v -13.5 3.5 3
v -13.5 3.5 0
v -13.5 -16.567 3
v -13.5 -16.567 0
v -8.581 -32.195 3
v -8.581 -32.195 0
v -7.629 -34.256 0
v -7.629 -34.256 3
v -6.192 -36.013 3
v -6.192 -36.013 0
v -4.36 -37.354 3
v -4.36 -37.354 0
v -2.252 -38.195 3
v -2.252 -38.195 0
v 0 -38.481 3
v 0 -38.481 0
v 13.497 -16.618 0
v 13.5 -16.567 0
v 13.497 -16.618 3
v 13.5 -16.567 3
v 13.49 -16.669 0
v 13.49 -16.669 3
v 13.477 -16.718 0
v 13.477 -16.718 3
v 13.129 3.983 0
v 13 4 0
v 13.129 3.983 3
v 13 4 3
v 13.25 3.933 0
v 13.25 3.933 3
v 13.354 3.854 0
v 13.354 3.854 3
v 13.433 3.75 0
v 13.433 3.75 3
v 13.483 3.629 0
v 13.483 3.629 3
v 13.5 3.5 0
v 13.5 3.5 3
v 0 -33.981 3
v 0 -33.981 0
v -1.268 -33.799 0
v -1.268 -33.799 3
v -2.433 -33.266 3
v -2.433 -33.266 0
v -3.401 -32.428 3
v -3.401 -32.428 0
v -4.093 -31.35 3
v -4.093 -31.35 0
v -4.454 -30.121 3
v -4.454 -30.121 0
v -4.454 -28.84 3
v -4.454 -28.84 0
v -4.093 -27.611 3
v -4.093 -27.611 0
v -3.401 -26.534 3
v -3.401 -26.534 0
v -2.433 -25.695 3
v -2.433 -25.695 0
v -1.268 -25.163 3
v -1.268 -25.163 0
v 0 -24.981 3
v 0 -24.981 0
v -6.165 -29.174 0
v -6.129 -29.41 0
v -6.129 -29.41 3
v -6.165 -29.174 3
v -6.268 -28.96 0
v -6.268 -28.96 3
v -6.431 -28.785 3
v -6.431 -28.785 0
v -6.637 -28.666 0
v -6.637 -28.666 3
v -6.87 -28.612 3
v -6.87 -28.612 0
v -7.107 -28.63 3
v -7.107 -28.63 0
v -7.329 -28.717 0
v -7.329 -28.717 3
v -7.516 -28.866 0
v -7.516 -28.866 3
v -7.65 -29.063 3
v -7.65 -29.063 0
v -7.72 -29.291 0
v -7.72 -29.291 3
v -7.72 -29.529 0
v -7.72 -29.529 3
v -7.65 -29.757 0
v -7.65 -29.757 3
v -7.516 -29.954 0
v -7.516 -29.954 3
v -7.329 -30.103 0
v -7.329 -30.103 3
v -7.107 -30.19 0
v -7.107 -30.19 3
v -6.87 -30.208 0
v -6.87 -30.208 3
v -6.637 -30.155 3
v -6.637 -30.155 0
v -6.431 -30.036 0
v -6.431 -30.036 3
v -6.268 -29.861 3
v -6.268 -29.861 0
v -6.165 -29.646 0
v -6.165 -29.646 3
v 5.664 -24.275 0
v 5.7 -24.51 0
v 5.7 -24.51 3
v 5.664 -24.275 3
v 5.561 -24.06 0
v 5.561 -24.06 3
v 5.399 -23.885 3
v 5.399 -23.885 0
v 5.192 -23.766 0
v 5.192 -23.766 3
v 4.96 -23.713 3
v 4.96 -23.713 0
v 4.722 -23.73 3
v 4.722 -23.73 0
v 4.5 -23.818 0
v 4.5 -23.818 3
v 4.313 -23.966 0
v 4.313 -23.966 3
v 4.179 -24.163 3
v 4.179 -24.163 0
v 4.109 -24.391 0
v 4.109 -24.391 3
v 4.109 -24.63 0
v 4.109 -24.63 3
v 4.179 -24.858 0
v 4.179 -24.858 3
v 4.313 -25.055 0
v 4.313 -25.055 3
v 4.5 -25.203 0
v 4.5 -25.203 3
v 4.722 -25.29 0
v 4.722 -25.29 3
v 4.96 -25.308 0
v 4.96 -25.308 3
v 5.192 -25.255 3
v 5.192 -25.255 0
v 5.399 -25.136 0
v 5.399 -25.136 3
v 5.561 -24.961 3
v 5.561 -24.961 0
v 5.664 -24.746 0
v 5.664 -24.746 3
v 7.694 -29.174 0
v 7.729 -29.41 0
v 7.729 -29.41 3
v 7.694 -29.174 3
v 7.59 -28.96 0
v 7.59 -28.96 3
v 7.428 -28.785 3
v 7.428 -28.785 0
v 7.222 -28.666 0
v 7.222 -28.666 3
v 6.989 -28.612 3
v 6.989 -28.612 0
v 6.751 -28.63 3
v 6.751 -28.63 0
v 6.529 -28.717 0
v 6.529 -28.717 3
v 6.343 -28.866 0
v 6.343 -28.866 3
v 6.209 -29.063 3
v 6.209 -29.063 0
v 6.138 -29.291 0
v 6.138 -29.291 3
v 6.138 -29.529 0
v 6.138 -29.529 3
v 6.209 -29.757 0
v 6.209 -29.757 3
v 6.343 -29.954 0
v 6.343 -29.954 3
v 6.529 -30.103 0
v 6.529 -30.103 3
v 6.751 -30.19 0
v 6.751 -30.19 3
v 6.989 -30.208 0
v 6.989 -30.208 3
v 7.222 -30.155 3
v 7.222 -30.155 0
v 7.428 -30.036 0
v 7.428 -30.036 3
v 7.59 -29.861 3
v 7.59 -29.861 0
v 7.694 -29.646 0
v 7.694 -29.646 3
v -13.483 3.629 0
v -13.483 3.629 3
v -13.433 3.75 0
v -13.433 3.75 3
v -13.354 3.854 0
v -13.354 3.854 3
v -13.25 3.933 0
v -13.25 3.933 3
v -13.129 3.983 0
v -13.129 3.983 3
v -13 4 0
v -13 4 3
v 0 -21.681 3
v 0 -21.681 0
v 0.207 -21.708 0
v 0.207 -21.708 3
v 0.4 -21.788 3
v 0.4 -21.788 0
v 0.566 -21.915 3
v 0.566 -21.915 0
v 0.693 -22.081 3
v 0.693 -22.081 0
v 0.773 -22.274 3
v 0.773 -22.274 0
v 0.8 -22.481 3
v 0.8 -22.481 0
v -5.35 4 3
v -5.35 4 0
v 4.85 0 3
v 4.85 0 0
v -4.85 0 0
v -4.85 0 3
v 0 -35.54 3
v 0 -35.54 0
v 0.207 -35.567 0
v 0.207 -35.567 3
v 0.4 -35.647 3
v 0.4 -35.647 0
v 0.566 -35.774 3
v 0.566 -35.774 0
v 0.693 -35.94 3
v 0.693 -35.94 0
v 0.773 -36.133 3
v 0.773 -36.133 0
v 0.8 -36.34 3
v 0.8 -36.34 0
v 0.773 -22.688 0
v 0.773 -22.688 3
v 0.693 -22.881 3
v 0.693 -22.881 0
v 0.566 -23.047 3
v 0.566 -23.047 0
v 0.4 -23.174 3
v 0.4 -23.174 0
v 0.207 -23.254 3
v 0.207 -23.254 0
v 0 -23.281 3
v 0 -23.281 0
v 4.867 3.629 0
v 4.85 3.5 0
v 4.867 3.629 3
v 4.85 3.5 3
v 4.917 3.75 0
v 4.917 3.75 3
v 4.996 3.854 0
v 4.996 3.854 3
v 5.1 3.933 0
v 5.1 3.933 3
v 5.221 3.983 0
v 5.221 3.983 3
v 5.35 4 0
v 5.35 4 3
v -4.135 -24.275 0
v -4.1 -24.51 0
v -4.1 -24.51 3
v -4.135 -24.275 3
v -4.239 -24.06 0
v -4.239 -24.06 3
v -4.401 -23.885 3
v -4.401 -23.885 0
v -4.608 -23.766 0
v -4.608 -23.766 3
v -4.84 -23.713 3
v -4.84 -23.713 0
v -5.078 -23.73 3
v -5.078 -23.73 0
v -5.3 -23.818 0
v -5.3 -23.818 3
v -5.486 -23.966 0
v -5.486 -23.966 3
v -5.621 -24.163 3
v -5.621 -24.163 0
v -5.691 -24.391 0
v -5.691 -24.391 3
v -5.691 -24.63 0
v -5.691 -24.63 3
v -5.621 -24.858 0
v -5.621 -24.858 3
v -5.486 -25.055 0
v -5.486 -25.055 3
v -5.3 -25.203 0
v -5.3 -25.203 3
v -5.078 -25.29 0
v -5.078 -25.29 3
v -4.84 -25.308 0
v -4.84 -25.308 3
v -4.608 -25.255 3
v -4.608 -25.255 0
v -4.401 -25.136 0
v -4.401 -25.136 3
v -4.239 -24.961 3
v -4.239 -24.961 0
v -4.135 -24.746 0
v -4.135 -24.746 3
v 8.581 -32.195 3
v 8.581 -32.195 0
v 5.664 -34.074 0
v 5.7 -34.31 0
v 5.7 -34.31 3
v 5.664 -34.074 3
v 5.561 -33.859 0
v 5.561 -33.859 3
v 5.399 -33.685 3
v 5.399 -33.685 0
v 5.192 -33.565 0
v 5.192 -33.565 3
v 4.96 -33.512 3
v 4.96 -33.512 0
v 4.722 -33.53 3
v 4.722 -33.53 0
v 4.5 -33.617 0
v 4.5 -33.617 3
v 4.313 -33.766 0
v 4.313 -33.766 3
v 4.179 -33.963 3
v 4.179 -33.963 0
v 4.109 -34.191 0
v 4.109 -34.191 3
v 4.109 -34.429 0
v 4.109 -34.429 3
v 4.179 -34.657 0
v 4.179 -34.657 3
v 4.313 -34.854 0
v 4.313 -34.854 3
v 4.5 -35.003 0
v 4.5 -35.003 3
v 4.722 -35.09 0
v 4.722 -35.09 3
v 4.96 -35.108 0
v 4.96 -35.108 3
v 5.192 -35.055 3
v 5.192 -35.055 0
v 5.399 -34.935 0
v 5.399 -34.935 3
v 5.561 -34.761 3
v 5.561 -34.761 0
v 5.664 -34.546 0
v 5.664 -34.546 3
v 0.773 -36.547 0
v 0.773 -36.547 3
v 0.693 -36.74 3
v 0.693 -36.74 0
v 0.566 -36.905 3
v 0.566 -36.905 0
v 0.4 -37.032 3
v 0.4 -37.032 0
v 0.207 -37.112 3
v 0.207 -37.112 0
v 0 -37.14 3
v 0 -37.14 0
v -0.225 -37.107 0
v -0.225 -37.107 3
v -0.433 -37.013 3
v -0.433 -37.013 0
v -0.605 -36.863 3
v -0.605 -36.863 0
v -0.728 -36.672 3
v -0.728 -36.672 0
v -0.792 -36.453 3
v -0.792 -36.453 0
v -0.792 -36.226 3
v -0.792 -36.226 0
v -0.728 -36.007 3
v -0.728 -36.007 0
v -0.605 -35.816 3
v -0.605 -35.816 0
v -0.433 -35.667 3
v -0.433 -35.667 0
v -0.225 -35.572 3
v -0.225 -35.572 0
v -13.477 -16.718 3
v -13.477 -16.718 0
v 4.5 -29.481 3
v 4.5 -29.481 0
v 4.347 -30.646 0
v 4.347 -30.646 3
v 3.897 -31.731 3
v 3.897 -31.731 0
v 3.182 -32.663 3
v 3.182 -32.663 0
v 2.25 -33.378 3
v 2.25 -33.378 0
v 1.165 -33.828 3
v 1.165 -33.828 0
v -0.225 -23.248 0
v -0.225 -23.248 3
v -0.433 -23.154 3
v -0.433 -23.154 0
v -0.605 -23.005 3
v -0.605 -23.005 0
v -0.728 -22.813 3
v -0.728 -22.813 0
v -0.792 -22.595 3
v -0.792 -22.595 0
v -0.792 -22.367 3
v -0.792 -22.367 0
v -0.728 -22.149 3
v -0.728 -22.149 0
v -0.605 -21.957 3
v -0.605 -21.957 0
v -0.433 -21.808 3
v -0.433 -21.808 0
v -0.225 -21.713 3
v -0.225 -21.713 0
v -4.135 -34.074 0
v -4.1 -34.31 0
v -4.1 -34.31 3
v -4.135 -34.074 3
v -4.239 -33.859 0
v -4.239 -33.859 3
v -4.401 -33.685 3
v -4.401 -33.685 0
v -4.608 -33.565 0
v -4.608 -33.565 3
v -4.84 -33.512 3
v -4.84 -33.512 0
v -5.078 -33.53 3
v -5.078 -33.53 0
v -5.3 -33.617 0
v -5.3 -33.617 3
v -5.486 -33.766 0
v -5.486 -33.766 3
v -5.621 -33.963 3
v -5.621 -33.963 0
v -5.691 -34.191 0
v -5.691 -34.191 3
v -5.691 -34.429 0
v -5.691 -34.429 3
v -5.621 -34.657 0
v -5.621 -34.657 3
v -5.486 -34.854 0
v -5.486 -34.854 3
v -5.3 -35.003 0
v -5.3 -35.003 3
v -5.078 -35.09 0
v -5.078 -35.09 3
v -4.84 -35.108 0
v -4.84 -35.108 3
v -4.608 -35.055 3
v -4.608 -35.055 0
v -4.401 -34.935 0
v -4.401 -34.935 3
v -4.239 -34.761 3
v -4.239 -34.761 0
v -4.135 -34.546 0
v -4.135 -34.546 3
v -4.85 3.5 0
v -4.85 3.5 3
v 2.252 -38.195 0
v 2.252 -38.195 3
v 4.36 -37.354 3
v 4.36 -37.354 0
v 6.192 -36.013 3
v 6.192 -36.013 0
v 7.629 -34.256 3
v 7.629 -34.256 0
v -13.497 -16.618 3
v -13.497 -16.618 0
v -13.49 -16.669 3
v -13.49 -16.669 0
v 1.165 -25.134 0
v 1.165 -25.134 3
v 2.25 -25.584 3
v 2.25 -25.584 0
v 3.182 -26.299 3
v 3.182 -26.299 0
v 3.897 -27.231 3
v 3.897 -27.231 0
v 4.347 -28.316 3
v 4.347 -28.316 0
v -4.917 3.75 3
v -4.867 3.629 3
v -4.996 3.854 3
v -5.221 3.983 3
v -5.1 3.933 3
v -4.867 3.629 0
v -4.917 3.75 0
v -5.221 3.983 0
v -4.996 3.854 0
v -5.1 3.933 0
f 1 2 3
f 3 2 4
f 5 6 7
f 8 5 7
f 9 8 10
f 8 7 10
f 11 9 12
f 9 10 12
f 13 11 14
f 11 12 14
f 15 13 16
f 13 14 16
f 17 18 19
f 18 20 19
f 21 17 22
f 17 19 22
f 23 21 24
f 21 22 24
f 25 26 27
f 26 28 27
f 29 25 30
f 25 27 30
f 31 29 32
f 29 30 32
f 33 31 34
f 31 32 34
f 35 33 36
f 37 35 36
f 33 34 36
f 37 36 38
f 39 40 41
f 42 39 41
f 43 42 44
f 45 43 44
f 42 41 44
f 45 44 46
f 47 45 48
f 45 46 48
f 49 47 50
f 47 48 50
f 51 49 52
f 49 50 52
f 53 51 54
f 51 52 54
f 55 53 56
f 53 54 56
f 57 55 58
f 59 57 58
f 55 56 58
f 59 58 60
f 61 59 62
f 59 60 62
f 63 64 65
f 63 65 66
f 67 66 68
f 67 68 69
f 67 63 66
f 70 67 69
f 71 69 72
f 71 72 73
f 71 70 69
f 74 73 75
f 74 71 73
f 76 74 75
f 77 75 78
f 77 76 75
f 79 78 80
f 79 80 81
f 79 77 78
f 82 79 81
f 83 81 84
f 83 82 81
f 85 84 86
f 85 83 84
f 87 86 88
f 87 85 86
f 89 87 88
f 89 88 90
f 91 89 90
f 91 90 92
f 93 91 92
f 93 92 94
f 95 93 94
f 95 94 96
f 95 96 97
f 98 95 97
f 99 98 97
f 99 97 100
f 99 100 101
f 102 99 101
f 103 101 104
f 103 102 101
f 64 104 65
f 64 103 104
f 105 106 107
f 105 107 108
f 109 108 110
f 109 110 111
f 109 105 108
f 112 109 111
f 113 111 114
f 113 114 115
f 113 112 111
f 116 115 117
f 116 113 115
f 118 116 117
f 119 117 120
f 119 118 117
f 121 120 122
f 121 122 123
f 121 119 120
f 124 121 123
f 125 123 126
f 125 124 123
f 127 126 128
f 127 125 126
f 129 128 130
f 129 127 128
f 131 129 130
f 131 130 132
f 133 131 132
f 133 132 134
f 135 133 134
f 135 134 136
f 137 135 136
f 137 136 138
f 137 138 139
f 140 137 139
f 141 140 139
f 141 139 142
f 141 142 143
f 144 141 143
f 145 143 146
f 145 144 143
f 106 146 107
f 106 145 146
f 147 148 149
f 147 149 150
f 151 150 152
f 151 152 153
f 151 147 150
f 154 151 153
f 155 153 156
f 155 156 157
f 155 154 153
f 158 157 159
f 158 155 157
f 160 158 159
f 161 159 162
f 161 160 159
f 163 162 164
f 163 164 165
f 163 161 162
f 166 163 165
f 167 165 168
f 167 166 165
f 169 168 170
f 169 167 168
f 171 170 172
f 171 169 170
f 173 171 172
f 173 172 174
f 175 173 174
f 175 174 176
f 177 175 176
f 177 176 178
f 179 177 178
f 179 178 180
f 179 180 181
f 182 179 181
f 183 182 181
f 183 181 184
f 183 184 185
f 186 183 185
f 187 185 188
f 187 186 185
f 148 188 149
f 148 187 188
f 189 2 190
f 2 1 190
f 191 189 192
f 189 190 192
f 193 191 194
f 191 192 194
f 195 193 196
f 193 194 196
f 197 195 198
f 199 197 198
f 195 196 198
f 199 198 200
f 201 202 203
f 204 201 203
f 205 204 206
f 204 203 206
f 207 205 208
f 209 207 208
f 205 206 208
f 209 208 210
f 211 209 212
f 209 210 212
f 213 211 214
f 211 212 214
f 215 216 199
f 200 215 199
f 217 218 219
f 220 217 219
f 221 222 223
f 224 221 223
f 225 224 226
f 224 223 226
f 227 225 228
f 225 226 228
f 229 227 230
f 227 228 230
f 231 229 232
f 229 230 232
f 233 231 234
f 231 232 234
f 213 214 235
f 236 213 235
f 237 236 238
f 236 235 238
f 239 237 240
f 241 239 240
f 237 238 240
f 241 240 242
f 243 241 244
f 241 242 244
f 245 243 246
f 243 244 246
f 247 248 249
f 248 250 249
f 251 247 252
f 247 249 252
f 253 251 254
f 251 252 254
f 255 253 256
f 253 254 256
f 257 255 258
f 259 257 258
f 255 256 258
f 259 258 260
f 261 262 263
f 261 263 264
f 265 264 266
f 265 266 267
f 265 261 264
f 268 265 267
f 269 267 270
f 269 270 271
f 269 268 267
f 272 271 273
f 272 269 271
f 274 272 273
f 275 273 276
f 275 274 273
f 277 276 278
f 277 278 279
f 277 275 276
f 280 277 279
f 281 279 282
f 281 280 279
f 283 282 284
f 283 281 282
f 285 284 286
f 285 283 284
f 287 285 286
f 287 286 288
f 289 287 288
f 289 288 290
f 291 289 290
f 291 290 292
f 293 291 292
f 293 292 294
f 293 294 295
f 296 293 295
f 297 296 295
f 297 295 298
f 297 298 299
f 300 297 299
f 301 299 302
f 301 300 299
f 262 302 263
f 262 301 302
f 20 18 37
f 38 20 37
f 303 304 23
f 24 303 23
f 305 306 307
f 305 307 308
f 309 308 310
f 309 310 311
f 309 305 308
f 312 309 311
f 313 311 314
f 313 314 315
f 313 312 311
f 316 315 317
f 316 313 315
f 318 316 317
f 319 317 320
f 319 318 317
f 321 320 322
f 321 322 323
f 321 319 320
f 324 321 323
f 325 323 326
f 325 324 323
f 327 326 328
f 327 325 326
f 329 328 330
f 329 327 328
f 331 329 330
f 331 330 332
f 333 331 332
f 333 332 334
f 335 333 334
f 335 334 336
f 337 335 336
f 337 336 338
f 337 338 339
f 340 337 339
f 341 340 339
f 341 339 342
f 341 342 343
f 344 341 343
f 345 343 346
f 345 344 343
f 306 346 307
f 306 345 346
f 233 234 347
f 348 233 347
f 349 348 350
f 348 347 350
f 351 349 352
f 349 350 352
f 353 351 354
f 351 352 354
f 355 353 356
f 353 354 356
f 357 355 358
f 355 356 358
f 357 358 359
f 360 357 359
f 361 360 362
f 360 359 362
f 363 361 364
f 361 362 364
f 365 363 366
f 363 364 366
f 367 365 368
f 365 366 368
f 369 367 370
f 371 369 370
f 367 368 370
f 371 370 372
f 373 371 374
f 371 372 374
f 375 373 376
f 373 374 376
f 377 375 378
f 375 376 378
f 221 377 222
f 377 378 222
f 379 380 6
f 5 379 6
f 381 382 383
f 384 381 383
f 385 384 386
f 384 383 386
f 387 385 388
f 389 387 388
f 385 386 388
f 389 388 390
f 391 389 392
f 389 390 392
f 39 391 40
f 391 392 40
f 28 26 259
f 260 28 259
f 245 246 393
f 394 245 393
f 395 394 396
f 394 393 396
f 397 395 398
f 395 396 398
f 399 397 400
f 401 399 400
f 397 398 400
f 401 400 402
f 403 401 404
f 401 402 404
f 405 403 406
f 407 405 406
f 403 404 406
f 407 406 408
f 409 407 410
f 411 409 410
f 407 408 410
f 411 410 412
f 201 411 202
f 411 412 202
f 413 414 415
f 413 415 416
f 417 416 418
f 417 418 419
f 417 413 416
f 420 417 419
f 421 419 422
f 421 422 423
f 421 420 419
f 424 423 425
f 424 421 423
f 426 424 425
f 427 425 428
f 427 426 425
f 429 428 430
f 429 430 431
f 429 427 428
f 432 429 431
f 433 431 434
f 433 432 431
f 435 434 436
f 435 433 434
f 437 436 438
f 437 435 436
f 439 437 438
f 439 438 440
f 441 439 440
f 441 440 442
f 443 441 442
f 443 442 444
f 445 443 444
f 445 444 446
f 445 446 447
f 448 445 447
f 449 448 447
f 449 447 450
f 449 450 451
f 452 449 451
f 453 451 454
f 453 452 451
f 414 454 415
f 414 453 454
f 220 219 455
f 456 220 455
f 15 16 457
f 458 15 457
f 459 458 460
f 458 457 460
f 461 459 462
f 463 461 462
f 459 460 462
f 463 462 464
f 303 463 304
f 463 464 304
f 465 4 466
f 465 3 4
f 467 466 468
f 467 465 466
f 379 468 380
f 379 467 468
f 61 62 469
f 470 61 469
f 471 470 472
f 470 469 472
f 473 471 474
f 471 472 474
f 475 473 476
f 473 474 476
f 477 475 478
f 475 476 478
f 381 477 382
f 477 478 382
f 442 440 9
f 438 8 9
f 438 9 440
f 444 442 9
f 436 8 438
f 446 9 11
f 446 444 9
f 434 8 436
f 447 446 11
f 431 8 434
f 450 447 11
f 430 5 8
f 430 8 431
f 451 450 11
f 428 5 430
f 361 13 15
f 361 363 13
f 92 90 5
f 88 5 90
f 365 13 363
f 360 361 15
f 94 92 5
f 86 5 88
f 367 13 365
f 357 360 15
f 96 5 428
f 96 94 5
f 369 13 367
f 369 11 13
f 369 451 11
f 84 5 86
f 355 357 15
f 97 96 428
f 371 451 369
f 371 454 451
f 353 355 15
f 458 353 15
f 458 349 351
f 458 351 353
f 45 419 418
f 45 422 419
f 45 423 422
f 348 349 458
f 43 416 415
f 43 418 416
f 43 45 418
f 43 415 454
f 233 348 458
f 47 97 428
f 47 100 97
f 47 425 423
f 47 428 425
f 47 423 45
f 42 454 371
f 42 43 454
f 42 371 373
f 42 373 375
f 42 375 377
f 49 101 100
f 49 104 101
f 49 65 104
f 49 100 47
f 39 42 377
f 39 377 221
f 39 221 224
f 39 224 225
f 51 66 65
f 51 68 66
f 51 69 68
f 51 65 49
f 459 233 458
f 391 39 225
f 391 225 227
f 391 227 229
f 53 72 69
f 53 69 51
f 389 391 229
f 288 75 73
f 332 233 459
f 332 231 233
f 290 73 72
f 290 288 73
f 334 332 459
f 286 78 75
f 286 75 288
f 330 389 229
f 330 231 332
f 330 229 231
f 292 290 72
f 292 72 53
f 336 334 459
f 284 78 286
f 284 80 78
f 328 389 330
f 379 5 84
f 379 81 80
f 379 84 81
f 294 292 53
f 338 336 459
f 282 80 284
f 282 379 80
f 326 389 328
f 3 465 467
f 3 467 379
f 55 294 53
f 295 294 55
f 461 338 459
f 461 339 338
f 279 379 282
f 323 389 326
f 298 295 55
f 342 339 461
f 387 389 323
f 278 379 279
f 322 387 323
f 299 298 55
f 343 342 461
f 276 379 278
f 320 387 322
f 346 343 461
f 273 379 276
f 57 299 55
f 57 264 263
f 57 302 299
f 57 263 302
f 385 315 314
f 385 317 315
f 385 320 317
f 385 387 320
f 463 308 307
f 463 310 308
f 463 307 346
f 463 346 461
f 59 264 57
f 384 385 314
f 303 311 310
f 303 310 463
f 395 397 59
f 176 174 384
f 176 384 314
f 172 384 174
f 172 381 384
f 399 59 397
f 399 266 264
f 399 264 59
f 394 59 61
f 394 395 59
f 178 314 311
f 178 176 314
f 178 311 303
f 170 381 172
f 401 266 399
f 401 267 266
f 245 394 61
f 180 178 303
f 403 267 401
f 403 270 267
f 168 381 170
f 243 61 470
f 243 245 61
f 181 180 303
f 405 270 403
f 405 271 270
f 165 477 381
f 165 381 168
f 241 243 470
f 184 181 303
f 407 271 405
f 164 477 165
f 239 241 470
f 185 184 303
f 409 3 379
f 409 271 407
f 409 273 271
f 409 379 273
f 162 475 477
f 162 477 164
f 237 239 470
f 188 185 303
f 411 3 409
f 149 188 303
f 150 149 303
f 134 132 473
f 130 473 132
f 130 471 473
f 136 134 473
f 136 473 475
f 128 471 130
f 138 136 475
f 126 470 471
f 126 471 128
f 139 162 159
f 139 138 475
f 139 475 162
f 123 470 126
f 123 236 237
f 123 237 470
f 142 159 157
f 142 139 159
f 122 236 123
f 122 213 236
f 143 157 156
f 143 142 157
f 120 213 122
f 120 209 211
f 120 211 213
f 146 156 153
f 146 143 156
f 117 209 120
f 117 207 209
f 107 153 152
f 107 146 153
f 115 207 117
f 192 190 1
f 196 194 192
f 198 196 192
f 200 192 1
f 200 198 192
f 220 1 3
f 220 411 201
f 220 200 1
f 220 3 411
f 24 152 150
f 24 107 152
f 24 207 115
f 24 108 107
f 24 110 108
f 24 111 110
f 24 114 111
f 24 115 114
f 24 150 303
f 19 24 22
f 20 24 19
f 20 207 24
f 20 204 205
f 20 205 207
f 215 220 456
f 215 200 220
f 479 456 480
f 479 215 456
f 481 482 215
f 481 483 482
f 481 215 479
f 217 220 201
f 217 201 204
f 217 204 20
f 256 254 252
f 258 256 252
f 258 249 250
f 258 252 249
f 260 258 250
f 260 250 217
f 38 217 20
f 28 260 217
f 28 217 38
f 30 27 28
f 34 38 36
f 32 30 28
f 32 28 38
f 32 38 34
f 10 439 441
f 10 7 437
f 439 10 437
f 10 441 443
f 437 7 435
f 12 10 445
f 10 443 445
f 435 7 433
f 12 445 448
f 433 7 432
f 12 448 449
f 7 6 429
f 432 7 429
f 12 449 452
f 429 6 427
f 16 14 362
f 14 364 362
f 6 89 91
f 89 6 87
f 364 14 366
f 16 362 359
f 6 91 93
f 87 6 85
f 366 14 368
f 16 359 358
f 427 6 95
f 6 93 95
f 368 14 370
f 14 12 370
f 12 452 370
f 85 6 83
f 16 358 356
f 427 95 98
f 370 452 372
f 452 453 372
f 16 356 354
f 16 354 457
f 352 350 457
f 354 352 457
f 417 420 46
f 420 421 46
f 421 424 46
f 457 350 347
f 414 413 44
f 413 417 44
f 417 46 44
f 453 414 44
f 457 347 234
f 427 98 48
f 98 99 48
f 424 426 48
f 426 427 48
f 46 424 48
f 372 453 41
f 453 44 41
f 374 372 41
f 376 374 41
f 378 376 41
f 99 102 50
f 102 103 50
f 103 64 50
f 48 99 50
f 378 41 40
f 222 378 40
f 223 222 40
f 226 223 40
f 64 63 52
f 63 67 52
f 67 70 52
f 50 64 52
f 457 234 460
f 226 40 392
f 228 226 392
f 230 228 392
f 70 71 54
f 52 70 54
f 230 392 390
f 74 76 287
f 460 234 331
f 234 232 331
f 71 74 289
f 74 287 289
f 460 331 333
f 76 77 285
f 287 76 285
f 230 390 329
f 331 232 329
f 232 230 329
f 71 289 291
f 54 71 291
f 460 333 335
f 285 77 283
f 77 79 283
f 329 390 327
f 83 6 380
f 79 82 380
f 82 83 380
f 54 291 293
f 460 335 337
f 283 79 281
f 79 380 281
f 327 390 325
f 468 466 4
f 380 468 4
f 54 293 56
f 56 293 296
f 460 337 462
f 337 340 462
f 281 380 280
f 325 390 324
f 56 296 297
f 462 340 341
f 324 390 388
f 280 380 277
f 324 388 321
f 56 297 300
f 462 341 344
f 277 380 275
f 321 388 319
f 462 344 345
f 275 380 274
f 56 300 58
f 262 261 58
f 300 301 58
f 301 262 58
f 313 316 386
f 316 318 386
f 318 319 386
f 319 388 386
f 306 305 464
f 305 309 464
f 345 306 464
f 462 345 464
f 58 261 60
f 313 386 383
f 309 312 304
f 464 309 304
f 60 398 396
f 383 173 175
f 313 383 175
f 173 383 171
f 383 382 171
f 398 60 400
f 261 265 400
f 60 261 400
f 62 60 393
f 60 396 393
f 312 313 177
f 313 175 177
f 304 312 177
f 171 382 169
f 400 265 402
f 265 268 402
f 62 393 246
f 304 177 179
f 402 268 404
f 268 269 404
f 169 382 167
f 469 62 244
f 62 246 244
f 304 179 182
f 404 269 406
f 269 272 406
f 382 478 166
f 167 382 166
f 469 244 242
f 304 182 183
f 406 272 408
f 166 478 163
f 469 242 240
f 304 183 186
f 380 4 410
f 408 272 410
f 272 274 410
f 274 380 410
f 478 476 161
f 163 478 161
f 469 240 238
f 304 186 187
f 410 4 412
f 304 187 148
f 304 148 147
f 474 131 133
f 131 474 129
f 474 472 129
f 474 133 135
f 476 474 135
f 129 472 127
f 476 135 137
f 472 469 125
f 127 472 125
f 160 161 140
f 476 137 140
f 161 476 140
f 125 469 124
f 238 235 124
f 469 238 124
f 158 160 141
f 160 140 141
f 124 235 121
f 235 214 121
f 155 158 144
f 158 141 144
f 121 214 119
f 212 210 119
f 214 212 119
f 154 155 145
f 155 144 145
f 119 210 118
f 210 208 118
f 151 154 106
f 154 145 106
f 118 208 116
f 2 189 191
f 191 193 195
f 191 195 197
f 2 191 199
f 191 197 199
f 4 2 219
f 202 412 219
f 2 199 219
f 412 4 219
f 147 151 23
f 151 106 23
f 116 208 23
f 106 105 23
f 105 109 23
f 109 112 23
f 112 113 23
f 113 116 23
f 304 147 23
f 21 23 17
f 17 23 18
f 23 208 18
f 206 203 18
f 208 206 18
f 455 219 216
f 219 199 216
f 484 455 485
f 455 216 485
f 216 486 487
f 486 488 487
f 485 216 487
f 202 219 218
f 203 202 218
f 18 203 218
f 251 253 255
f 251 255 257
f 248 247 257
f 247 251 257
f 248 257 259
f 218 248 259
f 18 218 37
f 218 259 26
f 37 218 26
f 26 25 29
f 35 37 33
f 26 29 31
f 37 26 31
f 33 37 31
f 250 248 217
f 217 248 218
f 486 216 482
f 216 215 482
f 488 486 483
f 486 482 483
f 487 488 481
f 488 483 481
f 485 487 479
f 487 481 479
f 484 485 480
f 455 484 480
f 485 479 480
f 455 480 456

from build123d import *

# Parameters (mm, degrees)
ESQUISSE1_R        = 0.8
BOSS_EXTRU_1_DEPTH = 3
CONG_1_R           = 0.5


with BuildPart() as part:
    # Esquisse1 → Boss.-Extru.1 (new body)
    # profile 1 of 4: a face of its own
    with BuildSketch(Plane.XY):
        with BuildLine():
            Line((-13.5, 4), (-13.5, 0))
            Line((-13.5, 0), (-13.5, -16.644680961))
            Line((-13.5, -16.644680961), (-8.580913976, -32.195227318))
            ThreePointArc((-8.580913976, -32.195227318), (-7.260492881, -24.162449633), (0, -20.4808369))
            Line((0, -20.4808369), (0, 0))
            Line((0, 0), (-4.85, 0))
            Line((-4.85, 0), (-4.85, 4))
            Line((-4.85, 4), (-13.5, 4))
        make_face()
    # profile 2 of 4: a face of its own
    with BuildSketch(Plane.XY):
        with BuildLine():
            Line((0, 0), (0, -20.4808369))
            ThreePointArc((0, -20.4808369), (6.363961031, -23.11687587), (9, -29.4808369))
            ThreePointArc((9, -29.4808369), (8.894611453, -30.85411295), (8.580913976, -32.195227318))
            Line((8.580913976, -32.195227318), (13.5, -16.644680961))
            Line((13.5, -16.644680961), (13.5, 0))
            Line((13.5, 0), (13.5, 4))
            Line((13.5, 4), (4.85, 4))
            Line((4.85, 4), (4.85, 0))
            Line((4.85, 0), (0, 0))
        make_face()
    # profile 3 of 4: a face of its own
    with BuildSketch(Plane.XY):
        with BuildLine():
            ThreePointArc((9, -29.4808369), (6.363961031, -23.11687587), (0, -20.4808369))
            Line((0, -20.4808369), (0, -21.6808369))
            ThreePointArc((0, -21.6808369), (0.565685425, -21.915151475), (0.8, -22.4808369))
            ThreePointArc((0.8, -22.4808369), (0.565685425, -23.046522325), (0, -23.2808369))
            Line((0, -23.2808369), (0, -24.9808369))
            ThreePointArc((0, -24.9808369), (3.181980515, -26.298856385), (4.5, -29.4808369))
            ThreePointArc((4.5, -29.4808369), (3.181980515, -32.662817416), (0, -33.9808369))
            Line((0, -33.9808369), (0, -35.539601481))
            ThreePointArc((0, -35.539601481), (0.565685425, -35.773916056), (0.8, -36.339601481))
            ThreePointArc((0.8, -36.339601481), (0.565685425, -36.905286906), (0, -37.139601481))
            Line((0, -37.139601481), (0, -38.4808369))
            ThreePointArc((0, -38.4808369), (5.318387267, -36.741329781), (8.580913976, -32.195227318))
            ThreePointArc((8.580913976, -32.195227318), (8.894611453, -30.85411295), (9, -29.4808369))
        make_face()
        with Locations((4.899813207, -34.310032397)):
            Circle(ESQUISSE1_R, mode=Mode.SUBTRACT)
        with Locations((6.92938229, -29.410219191)):
            Circle(ESQUISSE1_R, mode=Mode.SUBTRACT)
        with Locations((4.899813207, -24.510405984)):
            Circle(ESQUISSE1_R, mode=Mode.SUBTRACT)
    # profile 4 of 4: a face of its own
    with BuildSketch(Plane.XY):
        with BuildLine():
            ThreePointArc((0, -20.4808369), (-7.260492881, -24.162449633), (-8.580913976, -32.195227318))
            ThreePointArc((-8.580913976, -32.195227318), (-5.318387267, -36.741329781), (0, -38.4808369))
            Line((0, -38.4808369), (0, -37.139601481))
            ThreePointArc((0, -37.139601481), (-0.8, -36.339601481), (0, -35.539601481))
            Line((0, -35.539601481), (0, -33.9808369))
            ThreePointArc((0, -33.9808369), (-4.5, -29.4808369), (0, -24.9808369))
            Line((0, -24.9808369), (0, -23.2808369))
            ThreePointArc((0, -23.2808369), (-0.8, -22.4808369), (0, -21.6808369))
            Line((0, -21.6808369), (0, -20.4808369))
        make_face()
        with Locations((-6.92938229, -29.410219191)):
            Circle(ESQUISSE1_R, mode=Mode.SUBTRACT)
        with Locations((-4.899813207, -34.310032397)):
            Circle(ESQUISSE1_R, mode=Mode.SUBTRACT)
        with Locations((-4.899813207, -24.510405984)):
            Circle(ESQUISSE1_R, mode=Mode.SUBTRACT)
    extrude(amount=BOSS_EXTRU_1_DEPTH)

    # Congé1
    cong_1_edges = [part.edges().sort_by_distance(p)[0] for p in [
        (-13.5, -16.644680961, 1.5),
        (-13.5, 4, 1.5),
        (-4.85, 4, 1.5),
        (4.85, 4, 1.5),
        (13.5, 4, 1.5),
        (13.5, -16.644680961, 1.5),
    ]]
    fillet(cong_1_edges, radius=CONG_1_R)


solid = part.part
